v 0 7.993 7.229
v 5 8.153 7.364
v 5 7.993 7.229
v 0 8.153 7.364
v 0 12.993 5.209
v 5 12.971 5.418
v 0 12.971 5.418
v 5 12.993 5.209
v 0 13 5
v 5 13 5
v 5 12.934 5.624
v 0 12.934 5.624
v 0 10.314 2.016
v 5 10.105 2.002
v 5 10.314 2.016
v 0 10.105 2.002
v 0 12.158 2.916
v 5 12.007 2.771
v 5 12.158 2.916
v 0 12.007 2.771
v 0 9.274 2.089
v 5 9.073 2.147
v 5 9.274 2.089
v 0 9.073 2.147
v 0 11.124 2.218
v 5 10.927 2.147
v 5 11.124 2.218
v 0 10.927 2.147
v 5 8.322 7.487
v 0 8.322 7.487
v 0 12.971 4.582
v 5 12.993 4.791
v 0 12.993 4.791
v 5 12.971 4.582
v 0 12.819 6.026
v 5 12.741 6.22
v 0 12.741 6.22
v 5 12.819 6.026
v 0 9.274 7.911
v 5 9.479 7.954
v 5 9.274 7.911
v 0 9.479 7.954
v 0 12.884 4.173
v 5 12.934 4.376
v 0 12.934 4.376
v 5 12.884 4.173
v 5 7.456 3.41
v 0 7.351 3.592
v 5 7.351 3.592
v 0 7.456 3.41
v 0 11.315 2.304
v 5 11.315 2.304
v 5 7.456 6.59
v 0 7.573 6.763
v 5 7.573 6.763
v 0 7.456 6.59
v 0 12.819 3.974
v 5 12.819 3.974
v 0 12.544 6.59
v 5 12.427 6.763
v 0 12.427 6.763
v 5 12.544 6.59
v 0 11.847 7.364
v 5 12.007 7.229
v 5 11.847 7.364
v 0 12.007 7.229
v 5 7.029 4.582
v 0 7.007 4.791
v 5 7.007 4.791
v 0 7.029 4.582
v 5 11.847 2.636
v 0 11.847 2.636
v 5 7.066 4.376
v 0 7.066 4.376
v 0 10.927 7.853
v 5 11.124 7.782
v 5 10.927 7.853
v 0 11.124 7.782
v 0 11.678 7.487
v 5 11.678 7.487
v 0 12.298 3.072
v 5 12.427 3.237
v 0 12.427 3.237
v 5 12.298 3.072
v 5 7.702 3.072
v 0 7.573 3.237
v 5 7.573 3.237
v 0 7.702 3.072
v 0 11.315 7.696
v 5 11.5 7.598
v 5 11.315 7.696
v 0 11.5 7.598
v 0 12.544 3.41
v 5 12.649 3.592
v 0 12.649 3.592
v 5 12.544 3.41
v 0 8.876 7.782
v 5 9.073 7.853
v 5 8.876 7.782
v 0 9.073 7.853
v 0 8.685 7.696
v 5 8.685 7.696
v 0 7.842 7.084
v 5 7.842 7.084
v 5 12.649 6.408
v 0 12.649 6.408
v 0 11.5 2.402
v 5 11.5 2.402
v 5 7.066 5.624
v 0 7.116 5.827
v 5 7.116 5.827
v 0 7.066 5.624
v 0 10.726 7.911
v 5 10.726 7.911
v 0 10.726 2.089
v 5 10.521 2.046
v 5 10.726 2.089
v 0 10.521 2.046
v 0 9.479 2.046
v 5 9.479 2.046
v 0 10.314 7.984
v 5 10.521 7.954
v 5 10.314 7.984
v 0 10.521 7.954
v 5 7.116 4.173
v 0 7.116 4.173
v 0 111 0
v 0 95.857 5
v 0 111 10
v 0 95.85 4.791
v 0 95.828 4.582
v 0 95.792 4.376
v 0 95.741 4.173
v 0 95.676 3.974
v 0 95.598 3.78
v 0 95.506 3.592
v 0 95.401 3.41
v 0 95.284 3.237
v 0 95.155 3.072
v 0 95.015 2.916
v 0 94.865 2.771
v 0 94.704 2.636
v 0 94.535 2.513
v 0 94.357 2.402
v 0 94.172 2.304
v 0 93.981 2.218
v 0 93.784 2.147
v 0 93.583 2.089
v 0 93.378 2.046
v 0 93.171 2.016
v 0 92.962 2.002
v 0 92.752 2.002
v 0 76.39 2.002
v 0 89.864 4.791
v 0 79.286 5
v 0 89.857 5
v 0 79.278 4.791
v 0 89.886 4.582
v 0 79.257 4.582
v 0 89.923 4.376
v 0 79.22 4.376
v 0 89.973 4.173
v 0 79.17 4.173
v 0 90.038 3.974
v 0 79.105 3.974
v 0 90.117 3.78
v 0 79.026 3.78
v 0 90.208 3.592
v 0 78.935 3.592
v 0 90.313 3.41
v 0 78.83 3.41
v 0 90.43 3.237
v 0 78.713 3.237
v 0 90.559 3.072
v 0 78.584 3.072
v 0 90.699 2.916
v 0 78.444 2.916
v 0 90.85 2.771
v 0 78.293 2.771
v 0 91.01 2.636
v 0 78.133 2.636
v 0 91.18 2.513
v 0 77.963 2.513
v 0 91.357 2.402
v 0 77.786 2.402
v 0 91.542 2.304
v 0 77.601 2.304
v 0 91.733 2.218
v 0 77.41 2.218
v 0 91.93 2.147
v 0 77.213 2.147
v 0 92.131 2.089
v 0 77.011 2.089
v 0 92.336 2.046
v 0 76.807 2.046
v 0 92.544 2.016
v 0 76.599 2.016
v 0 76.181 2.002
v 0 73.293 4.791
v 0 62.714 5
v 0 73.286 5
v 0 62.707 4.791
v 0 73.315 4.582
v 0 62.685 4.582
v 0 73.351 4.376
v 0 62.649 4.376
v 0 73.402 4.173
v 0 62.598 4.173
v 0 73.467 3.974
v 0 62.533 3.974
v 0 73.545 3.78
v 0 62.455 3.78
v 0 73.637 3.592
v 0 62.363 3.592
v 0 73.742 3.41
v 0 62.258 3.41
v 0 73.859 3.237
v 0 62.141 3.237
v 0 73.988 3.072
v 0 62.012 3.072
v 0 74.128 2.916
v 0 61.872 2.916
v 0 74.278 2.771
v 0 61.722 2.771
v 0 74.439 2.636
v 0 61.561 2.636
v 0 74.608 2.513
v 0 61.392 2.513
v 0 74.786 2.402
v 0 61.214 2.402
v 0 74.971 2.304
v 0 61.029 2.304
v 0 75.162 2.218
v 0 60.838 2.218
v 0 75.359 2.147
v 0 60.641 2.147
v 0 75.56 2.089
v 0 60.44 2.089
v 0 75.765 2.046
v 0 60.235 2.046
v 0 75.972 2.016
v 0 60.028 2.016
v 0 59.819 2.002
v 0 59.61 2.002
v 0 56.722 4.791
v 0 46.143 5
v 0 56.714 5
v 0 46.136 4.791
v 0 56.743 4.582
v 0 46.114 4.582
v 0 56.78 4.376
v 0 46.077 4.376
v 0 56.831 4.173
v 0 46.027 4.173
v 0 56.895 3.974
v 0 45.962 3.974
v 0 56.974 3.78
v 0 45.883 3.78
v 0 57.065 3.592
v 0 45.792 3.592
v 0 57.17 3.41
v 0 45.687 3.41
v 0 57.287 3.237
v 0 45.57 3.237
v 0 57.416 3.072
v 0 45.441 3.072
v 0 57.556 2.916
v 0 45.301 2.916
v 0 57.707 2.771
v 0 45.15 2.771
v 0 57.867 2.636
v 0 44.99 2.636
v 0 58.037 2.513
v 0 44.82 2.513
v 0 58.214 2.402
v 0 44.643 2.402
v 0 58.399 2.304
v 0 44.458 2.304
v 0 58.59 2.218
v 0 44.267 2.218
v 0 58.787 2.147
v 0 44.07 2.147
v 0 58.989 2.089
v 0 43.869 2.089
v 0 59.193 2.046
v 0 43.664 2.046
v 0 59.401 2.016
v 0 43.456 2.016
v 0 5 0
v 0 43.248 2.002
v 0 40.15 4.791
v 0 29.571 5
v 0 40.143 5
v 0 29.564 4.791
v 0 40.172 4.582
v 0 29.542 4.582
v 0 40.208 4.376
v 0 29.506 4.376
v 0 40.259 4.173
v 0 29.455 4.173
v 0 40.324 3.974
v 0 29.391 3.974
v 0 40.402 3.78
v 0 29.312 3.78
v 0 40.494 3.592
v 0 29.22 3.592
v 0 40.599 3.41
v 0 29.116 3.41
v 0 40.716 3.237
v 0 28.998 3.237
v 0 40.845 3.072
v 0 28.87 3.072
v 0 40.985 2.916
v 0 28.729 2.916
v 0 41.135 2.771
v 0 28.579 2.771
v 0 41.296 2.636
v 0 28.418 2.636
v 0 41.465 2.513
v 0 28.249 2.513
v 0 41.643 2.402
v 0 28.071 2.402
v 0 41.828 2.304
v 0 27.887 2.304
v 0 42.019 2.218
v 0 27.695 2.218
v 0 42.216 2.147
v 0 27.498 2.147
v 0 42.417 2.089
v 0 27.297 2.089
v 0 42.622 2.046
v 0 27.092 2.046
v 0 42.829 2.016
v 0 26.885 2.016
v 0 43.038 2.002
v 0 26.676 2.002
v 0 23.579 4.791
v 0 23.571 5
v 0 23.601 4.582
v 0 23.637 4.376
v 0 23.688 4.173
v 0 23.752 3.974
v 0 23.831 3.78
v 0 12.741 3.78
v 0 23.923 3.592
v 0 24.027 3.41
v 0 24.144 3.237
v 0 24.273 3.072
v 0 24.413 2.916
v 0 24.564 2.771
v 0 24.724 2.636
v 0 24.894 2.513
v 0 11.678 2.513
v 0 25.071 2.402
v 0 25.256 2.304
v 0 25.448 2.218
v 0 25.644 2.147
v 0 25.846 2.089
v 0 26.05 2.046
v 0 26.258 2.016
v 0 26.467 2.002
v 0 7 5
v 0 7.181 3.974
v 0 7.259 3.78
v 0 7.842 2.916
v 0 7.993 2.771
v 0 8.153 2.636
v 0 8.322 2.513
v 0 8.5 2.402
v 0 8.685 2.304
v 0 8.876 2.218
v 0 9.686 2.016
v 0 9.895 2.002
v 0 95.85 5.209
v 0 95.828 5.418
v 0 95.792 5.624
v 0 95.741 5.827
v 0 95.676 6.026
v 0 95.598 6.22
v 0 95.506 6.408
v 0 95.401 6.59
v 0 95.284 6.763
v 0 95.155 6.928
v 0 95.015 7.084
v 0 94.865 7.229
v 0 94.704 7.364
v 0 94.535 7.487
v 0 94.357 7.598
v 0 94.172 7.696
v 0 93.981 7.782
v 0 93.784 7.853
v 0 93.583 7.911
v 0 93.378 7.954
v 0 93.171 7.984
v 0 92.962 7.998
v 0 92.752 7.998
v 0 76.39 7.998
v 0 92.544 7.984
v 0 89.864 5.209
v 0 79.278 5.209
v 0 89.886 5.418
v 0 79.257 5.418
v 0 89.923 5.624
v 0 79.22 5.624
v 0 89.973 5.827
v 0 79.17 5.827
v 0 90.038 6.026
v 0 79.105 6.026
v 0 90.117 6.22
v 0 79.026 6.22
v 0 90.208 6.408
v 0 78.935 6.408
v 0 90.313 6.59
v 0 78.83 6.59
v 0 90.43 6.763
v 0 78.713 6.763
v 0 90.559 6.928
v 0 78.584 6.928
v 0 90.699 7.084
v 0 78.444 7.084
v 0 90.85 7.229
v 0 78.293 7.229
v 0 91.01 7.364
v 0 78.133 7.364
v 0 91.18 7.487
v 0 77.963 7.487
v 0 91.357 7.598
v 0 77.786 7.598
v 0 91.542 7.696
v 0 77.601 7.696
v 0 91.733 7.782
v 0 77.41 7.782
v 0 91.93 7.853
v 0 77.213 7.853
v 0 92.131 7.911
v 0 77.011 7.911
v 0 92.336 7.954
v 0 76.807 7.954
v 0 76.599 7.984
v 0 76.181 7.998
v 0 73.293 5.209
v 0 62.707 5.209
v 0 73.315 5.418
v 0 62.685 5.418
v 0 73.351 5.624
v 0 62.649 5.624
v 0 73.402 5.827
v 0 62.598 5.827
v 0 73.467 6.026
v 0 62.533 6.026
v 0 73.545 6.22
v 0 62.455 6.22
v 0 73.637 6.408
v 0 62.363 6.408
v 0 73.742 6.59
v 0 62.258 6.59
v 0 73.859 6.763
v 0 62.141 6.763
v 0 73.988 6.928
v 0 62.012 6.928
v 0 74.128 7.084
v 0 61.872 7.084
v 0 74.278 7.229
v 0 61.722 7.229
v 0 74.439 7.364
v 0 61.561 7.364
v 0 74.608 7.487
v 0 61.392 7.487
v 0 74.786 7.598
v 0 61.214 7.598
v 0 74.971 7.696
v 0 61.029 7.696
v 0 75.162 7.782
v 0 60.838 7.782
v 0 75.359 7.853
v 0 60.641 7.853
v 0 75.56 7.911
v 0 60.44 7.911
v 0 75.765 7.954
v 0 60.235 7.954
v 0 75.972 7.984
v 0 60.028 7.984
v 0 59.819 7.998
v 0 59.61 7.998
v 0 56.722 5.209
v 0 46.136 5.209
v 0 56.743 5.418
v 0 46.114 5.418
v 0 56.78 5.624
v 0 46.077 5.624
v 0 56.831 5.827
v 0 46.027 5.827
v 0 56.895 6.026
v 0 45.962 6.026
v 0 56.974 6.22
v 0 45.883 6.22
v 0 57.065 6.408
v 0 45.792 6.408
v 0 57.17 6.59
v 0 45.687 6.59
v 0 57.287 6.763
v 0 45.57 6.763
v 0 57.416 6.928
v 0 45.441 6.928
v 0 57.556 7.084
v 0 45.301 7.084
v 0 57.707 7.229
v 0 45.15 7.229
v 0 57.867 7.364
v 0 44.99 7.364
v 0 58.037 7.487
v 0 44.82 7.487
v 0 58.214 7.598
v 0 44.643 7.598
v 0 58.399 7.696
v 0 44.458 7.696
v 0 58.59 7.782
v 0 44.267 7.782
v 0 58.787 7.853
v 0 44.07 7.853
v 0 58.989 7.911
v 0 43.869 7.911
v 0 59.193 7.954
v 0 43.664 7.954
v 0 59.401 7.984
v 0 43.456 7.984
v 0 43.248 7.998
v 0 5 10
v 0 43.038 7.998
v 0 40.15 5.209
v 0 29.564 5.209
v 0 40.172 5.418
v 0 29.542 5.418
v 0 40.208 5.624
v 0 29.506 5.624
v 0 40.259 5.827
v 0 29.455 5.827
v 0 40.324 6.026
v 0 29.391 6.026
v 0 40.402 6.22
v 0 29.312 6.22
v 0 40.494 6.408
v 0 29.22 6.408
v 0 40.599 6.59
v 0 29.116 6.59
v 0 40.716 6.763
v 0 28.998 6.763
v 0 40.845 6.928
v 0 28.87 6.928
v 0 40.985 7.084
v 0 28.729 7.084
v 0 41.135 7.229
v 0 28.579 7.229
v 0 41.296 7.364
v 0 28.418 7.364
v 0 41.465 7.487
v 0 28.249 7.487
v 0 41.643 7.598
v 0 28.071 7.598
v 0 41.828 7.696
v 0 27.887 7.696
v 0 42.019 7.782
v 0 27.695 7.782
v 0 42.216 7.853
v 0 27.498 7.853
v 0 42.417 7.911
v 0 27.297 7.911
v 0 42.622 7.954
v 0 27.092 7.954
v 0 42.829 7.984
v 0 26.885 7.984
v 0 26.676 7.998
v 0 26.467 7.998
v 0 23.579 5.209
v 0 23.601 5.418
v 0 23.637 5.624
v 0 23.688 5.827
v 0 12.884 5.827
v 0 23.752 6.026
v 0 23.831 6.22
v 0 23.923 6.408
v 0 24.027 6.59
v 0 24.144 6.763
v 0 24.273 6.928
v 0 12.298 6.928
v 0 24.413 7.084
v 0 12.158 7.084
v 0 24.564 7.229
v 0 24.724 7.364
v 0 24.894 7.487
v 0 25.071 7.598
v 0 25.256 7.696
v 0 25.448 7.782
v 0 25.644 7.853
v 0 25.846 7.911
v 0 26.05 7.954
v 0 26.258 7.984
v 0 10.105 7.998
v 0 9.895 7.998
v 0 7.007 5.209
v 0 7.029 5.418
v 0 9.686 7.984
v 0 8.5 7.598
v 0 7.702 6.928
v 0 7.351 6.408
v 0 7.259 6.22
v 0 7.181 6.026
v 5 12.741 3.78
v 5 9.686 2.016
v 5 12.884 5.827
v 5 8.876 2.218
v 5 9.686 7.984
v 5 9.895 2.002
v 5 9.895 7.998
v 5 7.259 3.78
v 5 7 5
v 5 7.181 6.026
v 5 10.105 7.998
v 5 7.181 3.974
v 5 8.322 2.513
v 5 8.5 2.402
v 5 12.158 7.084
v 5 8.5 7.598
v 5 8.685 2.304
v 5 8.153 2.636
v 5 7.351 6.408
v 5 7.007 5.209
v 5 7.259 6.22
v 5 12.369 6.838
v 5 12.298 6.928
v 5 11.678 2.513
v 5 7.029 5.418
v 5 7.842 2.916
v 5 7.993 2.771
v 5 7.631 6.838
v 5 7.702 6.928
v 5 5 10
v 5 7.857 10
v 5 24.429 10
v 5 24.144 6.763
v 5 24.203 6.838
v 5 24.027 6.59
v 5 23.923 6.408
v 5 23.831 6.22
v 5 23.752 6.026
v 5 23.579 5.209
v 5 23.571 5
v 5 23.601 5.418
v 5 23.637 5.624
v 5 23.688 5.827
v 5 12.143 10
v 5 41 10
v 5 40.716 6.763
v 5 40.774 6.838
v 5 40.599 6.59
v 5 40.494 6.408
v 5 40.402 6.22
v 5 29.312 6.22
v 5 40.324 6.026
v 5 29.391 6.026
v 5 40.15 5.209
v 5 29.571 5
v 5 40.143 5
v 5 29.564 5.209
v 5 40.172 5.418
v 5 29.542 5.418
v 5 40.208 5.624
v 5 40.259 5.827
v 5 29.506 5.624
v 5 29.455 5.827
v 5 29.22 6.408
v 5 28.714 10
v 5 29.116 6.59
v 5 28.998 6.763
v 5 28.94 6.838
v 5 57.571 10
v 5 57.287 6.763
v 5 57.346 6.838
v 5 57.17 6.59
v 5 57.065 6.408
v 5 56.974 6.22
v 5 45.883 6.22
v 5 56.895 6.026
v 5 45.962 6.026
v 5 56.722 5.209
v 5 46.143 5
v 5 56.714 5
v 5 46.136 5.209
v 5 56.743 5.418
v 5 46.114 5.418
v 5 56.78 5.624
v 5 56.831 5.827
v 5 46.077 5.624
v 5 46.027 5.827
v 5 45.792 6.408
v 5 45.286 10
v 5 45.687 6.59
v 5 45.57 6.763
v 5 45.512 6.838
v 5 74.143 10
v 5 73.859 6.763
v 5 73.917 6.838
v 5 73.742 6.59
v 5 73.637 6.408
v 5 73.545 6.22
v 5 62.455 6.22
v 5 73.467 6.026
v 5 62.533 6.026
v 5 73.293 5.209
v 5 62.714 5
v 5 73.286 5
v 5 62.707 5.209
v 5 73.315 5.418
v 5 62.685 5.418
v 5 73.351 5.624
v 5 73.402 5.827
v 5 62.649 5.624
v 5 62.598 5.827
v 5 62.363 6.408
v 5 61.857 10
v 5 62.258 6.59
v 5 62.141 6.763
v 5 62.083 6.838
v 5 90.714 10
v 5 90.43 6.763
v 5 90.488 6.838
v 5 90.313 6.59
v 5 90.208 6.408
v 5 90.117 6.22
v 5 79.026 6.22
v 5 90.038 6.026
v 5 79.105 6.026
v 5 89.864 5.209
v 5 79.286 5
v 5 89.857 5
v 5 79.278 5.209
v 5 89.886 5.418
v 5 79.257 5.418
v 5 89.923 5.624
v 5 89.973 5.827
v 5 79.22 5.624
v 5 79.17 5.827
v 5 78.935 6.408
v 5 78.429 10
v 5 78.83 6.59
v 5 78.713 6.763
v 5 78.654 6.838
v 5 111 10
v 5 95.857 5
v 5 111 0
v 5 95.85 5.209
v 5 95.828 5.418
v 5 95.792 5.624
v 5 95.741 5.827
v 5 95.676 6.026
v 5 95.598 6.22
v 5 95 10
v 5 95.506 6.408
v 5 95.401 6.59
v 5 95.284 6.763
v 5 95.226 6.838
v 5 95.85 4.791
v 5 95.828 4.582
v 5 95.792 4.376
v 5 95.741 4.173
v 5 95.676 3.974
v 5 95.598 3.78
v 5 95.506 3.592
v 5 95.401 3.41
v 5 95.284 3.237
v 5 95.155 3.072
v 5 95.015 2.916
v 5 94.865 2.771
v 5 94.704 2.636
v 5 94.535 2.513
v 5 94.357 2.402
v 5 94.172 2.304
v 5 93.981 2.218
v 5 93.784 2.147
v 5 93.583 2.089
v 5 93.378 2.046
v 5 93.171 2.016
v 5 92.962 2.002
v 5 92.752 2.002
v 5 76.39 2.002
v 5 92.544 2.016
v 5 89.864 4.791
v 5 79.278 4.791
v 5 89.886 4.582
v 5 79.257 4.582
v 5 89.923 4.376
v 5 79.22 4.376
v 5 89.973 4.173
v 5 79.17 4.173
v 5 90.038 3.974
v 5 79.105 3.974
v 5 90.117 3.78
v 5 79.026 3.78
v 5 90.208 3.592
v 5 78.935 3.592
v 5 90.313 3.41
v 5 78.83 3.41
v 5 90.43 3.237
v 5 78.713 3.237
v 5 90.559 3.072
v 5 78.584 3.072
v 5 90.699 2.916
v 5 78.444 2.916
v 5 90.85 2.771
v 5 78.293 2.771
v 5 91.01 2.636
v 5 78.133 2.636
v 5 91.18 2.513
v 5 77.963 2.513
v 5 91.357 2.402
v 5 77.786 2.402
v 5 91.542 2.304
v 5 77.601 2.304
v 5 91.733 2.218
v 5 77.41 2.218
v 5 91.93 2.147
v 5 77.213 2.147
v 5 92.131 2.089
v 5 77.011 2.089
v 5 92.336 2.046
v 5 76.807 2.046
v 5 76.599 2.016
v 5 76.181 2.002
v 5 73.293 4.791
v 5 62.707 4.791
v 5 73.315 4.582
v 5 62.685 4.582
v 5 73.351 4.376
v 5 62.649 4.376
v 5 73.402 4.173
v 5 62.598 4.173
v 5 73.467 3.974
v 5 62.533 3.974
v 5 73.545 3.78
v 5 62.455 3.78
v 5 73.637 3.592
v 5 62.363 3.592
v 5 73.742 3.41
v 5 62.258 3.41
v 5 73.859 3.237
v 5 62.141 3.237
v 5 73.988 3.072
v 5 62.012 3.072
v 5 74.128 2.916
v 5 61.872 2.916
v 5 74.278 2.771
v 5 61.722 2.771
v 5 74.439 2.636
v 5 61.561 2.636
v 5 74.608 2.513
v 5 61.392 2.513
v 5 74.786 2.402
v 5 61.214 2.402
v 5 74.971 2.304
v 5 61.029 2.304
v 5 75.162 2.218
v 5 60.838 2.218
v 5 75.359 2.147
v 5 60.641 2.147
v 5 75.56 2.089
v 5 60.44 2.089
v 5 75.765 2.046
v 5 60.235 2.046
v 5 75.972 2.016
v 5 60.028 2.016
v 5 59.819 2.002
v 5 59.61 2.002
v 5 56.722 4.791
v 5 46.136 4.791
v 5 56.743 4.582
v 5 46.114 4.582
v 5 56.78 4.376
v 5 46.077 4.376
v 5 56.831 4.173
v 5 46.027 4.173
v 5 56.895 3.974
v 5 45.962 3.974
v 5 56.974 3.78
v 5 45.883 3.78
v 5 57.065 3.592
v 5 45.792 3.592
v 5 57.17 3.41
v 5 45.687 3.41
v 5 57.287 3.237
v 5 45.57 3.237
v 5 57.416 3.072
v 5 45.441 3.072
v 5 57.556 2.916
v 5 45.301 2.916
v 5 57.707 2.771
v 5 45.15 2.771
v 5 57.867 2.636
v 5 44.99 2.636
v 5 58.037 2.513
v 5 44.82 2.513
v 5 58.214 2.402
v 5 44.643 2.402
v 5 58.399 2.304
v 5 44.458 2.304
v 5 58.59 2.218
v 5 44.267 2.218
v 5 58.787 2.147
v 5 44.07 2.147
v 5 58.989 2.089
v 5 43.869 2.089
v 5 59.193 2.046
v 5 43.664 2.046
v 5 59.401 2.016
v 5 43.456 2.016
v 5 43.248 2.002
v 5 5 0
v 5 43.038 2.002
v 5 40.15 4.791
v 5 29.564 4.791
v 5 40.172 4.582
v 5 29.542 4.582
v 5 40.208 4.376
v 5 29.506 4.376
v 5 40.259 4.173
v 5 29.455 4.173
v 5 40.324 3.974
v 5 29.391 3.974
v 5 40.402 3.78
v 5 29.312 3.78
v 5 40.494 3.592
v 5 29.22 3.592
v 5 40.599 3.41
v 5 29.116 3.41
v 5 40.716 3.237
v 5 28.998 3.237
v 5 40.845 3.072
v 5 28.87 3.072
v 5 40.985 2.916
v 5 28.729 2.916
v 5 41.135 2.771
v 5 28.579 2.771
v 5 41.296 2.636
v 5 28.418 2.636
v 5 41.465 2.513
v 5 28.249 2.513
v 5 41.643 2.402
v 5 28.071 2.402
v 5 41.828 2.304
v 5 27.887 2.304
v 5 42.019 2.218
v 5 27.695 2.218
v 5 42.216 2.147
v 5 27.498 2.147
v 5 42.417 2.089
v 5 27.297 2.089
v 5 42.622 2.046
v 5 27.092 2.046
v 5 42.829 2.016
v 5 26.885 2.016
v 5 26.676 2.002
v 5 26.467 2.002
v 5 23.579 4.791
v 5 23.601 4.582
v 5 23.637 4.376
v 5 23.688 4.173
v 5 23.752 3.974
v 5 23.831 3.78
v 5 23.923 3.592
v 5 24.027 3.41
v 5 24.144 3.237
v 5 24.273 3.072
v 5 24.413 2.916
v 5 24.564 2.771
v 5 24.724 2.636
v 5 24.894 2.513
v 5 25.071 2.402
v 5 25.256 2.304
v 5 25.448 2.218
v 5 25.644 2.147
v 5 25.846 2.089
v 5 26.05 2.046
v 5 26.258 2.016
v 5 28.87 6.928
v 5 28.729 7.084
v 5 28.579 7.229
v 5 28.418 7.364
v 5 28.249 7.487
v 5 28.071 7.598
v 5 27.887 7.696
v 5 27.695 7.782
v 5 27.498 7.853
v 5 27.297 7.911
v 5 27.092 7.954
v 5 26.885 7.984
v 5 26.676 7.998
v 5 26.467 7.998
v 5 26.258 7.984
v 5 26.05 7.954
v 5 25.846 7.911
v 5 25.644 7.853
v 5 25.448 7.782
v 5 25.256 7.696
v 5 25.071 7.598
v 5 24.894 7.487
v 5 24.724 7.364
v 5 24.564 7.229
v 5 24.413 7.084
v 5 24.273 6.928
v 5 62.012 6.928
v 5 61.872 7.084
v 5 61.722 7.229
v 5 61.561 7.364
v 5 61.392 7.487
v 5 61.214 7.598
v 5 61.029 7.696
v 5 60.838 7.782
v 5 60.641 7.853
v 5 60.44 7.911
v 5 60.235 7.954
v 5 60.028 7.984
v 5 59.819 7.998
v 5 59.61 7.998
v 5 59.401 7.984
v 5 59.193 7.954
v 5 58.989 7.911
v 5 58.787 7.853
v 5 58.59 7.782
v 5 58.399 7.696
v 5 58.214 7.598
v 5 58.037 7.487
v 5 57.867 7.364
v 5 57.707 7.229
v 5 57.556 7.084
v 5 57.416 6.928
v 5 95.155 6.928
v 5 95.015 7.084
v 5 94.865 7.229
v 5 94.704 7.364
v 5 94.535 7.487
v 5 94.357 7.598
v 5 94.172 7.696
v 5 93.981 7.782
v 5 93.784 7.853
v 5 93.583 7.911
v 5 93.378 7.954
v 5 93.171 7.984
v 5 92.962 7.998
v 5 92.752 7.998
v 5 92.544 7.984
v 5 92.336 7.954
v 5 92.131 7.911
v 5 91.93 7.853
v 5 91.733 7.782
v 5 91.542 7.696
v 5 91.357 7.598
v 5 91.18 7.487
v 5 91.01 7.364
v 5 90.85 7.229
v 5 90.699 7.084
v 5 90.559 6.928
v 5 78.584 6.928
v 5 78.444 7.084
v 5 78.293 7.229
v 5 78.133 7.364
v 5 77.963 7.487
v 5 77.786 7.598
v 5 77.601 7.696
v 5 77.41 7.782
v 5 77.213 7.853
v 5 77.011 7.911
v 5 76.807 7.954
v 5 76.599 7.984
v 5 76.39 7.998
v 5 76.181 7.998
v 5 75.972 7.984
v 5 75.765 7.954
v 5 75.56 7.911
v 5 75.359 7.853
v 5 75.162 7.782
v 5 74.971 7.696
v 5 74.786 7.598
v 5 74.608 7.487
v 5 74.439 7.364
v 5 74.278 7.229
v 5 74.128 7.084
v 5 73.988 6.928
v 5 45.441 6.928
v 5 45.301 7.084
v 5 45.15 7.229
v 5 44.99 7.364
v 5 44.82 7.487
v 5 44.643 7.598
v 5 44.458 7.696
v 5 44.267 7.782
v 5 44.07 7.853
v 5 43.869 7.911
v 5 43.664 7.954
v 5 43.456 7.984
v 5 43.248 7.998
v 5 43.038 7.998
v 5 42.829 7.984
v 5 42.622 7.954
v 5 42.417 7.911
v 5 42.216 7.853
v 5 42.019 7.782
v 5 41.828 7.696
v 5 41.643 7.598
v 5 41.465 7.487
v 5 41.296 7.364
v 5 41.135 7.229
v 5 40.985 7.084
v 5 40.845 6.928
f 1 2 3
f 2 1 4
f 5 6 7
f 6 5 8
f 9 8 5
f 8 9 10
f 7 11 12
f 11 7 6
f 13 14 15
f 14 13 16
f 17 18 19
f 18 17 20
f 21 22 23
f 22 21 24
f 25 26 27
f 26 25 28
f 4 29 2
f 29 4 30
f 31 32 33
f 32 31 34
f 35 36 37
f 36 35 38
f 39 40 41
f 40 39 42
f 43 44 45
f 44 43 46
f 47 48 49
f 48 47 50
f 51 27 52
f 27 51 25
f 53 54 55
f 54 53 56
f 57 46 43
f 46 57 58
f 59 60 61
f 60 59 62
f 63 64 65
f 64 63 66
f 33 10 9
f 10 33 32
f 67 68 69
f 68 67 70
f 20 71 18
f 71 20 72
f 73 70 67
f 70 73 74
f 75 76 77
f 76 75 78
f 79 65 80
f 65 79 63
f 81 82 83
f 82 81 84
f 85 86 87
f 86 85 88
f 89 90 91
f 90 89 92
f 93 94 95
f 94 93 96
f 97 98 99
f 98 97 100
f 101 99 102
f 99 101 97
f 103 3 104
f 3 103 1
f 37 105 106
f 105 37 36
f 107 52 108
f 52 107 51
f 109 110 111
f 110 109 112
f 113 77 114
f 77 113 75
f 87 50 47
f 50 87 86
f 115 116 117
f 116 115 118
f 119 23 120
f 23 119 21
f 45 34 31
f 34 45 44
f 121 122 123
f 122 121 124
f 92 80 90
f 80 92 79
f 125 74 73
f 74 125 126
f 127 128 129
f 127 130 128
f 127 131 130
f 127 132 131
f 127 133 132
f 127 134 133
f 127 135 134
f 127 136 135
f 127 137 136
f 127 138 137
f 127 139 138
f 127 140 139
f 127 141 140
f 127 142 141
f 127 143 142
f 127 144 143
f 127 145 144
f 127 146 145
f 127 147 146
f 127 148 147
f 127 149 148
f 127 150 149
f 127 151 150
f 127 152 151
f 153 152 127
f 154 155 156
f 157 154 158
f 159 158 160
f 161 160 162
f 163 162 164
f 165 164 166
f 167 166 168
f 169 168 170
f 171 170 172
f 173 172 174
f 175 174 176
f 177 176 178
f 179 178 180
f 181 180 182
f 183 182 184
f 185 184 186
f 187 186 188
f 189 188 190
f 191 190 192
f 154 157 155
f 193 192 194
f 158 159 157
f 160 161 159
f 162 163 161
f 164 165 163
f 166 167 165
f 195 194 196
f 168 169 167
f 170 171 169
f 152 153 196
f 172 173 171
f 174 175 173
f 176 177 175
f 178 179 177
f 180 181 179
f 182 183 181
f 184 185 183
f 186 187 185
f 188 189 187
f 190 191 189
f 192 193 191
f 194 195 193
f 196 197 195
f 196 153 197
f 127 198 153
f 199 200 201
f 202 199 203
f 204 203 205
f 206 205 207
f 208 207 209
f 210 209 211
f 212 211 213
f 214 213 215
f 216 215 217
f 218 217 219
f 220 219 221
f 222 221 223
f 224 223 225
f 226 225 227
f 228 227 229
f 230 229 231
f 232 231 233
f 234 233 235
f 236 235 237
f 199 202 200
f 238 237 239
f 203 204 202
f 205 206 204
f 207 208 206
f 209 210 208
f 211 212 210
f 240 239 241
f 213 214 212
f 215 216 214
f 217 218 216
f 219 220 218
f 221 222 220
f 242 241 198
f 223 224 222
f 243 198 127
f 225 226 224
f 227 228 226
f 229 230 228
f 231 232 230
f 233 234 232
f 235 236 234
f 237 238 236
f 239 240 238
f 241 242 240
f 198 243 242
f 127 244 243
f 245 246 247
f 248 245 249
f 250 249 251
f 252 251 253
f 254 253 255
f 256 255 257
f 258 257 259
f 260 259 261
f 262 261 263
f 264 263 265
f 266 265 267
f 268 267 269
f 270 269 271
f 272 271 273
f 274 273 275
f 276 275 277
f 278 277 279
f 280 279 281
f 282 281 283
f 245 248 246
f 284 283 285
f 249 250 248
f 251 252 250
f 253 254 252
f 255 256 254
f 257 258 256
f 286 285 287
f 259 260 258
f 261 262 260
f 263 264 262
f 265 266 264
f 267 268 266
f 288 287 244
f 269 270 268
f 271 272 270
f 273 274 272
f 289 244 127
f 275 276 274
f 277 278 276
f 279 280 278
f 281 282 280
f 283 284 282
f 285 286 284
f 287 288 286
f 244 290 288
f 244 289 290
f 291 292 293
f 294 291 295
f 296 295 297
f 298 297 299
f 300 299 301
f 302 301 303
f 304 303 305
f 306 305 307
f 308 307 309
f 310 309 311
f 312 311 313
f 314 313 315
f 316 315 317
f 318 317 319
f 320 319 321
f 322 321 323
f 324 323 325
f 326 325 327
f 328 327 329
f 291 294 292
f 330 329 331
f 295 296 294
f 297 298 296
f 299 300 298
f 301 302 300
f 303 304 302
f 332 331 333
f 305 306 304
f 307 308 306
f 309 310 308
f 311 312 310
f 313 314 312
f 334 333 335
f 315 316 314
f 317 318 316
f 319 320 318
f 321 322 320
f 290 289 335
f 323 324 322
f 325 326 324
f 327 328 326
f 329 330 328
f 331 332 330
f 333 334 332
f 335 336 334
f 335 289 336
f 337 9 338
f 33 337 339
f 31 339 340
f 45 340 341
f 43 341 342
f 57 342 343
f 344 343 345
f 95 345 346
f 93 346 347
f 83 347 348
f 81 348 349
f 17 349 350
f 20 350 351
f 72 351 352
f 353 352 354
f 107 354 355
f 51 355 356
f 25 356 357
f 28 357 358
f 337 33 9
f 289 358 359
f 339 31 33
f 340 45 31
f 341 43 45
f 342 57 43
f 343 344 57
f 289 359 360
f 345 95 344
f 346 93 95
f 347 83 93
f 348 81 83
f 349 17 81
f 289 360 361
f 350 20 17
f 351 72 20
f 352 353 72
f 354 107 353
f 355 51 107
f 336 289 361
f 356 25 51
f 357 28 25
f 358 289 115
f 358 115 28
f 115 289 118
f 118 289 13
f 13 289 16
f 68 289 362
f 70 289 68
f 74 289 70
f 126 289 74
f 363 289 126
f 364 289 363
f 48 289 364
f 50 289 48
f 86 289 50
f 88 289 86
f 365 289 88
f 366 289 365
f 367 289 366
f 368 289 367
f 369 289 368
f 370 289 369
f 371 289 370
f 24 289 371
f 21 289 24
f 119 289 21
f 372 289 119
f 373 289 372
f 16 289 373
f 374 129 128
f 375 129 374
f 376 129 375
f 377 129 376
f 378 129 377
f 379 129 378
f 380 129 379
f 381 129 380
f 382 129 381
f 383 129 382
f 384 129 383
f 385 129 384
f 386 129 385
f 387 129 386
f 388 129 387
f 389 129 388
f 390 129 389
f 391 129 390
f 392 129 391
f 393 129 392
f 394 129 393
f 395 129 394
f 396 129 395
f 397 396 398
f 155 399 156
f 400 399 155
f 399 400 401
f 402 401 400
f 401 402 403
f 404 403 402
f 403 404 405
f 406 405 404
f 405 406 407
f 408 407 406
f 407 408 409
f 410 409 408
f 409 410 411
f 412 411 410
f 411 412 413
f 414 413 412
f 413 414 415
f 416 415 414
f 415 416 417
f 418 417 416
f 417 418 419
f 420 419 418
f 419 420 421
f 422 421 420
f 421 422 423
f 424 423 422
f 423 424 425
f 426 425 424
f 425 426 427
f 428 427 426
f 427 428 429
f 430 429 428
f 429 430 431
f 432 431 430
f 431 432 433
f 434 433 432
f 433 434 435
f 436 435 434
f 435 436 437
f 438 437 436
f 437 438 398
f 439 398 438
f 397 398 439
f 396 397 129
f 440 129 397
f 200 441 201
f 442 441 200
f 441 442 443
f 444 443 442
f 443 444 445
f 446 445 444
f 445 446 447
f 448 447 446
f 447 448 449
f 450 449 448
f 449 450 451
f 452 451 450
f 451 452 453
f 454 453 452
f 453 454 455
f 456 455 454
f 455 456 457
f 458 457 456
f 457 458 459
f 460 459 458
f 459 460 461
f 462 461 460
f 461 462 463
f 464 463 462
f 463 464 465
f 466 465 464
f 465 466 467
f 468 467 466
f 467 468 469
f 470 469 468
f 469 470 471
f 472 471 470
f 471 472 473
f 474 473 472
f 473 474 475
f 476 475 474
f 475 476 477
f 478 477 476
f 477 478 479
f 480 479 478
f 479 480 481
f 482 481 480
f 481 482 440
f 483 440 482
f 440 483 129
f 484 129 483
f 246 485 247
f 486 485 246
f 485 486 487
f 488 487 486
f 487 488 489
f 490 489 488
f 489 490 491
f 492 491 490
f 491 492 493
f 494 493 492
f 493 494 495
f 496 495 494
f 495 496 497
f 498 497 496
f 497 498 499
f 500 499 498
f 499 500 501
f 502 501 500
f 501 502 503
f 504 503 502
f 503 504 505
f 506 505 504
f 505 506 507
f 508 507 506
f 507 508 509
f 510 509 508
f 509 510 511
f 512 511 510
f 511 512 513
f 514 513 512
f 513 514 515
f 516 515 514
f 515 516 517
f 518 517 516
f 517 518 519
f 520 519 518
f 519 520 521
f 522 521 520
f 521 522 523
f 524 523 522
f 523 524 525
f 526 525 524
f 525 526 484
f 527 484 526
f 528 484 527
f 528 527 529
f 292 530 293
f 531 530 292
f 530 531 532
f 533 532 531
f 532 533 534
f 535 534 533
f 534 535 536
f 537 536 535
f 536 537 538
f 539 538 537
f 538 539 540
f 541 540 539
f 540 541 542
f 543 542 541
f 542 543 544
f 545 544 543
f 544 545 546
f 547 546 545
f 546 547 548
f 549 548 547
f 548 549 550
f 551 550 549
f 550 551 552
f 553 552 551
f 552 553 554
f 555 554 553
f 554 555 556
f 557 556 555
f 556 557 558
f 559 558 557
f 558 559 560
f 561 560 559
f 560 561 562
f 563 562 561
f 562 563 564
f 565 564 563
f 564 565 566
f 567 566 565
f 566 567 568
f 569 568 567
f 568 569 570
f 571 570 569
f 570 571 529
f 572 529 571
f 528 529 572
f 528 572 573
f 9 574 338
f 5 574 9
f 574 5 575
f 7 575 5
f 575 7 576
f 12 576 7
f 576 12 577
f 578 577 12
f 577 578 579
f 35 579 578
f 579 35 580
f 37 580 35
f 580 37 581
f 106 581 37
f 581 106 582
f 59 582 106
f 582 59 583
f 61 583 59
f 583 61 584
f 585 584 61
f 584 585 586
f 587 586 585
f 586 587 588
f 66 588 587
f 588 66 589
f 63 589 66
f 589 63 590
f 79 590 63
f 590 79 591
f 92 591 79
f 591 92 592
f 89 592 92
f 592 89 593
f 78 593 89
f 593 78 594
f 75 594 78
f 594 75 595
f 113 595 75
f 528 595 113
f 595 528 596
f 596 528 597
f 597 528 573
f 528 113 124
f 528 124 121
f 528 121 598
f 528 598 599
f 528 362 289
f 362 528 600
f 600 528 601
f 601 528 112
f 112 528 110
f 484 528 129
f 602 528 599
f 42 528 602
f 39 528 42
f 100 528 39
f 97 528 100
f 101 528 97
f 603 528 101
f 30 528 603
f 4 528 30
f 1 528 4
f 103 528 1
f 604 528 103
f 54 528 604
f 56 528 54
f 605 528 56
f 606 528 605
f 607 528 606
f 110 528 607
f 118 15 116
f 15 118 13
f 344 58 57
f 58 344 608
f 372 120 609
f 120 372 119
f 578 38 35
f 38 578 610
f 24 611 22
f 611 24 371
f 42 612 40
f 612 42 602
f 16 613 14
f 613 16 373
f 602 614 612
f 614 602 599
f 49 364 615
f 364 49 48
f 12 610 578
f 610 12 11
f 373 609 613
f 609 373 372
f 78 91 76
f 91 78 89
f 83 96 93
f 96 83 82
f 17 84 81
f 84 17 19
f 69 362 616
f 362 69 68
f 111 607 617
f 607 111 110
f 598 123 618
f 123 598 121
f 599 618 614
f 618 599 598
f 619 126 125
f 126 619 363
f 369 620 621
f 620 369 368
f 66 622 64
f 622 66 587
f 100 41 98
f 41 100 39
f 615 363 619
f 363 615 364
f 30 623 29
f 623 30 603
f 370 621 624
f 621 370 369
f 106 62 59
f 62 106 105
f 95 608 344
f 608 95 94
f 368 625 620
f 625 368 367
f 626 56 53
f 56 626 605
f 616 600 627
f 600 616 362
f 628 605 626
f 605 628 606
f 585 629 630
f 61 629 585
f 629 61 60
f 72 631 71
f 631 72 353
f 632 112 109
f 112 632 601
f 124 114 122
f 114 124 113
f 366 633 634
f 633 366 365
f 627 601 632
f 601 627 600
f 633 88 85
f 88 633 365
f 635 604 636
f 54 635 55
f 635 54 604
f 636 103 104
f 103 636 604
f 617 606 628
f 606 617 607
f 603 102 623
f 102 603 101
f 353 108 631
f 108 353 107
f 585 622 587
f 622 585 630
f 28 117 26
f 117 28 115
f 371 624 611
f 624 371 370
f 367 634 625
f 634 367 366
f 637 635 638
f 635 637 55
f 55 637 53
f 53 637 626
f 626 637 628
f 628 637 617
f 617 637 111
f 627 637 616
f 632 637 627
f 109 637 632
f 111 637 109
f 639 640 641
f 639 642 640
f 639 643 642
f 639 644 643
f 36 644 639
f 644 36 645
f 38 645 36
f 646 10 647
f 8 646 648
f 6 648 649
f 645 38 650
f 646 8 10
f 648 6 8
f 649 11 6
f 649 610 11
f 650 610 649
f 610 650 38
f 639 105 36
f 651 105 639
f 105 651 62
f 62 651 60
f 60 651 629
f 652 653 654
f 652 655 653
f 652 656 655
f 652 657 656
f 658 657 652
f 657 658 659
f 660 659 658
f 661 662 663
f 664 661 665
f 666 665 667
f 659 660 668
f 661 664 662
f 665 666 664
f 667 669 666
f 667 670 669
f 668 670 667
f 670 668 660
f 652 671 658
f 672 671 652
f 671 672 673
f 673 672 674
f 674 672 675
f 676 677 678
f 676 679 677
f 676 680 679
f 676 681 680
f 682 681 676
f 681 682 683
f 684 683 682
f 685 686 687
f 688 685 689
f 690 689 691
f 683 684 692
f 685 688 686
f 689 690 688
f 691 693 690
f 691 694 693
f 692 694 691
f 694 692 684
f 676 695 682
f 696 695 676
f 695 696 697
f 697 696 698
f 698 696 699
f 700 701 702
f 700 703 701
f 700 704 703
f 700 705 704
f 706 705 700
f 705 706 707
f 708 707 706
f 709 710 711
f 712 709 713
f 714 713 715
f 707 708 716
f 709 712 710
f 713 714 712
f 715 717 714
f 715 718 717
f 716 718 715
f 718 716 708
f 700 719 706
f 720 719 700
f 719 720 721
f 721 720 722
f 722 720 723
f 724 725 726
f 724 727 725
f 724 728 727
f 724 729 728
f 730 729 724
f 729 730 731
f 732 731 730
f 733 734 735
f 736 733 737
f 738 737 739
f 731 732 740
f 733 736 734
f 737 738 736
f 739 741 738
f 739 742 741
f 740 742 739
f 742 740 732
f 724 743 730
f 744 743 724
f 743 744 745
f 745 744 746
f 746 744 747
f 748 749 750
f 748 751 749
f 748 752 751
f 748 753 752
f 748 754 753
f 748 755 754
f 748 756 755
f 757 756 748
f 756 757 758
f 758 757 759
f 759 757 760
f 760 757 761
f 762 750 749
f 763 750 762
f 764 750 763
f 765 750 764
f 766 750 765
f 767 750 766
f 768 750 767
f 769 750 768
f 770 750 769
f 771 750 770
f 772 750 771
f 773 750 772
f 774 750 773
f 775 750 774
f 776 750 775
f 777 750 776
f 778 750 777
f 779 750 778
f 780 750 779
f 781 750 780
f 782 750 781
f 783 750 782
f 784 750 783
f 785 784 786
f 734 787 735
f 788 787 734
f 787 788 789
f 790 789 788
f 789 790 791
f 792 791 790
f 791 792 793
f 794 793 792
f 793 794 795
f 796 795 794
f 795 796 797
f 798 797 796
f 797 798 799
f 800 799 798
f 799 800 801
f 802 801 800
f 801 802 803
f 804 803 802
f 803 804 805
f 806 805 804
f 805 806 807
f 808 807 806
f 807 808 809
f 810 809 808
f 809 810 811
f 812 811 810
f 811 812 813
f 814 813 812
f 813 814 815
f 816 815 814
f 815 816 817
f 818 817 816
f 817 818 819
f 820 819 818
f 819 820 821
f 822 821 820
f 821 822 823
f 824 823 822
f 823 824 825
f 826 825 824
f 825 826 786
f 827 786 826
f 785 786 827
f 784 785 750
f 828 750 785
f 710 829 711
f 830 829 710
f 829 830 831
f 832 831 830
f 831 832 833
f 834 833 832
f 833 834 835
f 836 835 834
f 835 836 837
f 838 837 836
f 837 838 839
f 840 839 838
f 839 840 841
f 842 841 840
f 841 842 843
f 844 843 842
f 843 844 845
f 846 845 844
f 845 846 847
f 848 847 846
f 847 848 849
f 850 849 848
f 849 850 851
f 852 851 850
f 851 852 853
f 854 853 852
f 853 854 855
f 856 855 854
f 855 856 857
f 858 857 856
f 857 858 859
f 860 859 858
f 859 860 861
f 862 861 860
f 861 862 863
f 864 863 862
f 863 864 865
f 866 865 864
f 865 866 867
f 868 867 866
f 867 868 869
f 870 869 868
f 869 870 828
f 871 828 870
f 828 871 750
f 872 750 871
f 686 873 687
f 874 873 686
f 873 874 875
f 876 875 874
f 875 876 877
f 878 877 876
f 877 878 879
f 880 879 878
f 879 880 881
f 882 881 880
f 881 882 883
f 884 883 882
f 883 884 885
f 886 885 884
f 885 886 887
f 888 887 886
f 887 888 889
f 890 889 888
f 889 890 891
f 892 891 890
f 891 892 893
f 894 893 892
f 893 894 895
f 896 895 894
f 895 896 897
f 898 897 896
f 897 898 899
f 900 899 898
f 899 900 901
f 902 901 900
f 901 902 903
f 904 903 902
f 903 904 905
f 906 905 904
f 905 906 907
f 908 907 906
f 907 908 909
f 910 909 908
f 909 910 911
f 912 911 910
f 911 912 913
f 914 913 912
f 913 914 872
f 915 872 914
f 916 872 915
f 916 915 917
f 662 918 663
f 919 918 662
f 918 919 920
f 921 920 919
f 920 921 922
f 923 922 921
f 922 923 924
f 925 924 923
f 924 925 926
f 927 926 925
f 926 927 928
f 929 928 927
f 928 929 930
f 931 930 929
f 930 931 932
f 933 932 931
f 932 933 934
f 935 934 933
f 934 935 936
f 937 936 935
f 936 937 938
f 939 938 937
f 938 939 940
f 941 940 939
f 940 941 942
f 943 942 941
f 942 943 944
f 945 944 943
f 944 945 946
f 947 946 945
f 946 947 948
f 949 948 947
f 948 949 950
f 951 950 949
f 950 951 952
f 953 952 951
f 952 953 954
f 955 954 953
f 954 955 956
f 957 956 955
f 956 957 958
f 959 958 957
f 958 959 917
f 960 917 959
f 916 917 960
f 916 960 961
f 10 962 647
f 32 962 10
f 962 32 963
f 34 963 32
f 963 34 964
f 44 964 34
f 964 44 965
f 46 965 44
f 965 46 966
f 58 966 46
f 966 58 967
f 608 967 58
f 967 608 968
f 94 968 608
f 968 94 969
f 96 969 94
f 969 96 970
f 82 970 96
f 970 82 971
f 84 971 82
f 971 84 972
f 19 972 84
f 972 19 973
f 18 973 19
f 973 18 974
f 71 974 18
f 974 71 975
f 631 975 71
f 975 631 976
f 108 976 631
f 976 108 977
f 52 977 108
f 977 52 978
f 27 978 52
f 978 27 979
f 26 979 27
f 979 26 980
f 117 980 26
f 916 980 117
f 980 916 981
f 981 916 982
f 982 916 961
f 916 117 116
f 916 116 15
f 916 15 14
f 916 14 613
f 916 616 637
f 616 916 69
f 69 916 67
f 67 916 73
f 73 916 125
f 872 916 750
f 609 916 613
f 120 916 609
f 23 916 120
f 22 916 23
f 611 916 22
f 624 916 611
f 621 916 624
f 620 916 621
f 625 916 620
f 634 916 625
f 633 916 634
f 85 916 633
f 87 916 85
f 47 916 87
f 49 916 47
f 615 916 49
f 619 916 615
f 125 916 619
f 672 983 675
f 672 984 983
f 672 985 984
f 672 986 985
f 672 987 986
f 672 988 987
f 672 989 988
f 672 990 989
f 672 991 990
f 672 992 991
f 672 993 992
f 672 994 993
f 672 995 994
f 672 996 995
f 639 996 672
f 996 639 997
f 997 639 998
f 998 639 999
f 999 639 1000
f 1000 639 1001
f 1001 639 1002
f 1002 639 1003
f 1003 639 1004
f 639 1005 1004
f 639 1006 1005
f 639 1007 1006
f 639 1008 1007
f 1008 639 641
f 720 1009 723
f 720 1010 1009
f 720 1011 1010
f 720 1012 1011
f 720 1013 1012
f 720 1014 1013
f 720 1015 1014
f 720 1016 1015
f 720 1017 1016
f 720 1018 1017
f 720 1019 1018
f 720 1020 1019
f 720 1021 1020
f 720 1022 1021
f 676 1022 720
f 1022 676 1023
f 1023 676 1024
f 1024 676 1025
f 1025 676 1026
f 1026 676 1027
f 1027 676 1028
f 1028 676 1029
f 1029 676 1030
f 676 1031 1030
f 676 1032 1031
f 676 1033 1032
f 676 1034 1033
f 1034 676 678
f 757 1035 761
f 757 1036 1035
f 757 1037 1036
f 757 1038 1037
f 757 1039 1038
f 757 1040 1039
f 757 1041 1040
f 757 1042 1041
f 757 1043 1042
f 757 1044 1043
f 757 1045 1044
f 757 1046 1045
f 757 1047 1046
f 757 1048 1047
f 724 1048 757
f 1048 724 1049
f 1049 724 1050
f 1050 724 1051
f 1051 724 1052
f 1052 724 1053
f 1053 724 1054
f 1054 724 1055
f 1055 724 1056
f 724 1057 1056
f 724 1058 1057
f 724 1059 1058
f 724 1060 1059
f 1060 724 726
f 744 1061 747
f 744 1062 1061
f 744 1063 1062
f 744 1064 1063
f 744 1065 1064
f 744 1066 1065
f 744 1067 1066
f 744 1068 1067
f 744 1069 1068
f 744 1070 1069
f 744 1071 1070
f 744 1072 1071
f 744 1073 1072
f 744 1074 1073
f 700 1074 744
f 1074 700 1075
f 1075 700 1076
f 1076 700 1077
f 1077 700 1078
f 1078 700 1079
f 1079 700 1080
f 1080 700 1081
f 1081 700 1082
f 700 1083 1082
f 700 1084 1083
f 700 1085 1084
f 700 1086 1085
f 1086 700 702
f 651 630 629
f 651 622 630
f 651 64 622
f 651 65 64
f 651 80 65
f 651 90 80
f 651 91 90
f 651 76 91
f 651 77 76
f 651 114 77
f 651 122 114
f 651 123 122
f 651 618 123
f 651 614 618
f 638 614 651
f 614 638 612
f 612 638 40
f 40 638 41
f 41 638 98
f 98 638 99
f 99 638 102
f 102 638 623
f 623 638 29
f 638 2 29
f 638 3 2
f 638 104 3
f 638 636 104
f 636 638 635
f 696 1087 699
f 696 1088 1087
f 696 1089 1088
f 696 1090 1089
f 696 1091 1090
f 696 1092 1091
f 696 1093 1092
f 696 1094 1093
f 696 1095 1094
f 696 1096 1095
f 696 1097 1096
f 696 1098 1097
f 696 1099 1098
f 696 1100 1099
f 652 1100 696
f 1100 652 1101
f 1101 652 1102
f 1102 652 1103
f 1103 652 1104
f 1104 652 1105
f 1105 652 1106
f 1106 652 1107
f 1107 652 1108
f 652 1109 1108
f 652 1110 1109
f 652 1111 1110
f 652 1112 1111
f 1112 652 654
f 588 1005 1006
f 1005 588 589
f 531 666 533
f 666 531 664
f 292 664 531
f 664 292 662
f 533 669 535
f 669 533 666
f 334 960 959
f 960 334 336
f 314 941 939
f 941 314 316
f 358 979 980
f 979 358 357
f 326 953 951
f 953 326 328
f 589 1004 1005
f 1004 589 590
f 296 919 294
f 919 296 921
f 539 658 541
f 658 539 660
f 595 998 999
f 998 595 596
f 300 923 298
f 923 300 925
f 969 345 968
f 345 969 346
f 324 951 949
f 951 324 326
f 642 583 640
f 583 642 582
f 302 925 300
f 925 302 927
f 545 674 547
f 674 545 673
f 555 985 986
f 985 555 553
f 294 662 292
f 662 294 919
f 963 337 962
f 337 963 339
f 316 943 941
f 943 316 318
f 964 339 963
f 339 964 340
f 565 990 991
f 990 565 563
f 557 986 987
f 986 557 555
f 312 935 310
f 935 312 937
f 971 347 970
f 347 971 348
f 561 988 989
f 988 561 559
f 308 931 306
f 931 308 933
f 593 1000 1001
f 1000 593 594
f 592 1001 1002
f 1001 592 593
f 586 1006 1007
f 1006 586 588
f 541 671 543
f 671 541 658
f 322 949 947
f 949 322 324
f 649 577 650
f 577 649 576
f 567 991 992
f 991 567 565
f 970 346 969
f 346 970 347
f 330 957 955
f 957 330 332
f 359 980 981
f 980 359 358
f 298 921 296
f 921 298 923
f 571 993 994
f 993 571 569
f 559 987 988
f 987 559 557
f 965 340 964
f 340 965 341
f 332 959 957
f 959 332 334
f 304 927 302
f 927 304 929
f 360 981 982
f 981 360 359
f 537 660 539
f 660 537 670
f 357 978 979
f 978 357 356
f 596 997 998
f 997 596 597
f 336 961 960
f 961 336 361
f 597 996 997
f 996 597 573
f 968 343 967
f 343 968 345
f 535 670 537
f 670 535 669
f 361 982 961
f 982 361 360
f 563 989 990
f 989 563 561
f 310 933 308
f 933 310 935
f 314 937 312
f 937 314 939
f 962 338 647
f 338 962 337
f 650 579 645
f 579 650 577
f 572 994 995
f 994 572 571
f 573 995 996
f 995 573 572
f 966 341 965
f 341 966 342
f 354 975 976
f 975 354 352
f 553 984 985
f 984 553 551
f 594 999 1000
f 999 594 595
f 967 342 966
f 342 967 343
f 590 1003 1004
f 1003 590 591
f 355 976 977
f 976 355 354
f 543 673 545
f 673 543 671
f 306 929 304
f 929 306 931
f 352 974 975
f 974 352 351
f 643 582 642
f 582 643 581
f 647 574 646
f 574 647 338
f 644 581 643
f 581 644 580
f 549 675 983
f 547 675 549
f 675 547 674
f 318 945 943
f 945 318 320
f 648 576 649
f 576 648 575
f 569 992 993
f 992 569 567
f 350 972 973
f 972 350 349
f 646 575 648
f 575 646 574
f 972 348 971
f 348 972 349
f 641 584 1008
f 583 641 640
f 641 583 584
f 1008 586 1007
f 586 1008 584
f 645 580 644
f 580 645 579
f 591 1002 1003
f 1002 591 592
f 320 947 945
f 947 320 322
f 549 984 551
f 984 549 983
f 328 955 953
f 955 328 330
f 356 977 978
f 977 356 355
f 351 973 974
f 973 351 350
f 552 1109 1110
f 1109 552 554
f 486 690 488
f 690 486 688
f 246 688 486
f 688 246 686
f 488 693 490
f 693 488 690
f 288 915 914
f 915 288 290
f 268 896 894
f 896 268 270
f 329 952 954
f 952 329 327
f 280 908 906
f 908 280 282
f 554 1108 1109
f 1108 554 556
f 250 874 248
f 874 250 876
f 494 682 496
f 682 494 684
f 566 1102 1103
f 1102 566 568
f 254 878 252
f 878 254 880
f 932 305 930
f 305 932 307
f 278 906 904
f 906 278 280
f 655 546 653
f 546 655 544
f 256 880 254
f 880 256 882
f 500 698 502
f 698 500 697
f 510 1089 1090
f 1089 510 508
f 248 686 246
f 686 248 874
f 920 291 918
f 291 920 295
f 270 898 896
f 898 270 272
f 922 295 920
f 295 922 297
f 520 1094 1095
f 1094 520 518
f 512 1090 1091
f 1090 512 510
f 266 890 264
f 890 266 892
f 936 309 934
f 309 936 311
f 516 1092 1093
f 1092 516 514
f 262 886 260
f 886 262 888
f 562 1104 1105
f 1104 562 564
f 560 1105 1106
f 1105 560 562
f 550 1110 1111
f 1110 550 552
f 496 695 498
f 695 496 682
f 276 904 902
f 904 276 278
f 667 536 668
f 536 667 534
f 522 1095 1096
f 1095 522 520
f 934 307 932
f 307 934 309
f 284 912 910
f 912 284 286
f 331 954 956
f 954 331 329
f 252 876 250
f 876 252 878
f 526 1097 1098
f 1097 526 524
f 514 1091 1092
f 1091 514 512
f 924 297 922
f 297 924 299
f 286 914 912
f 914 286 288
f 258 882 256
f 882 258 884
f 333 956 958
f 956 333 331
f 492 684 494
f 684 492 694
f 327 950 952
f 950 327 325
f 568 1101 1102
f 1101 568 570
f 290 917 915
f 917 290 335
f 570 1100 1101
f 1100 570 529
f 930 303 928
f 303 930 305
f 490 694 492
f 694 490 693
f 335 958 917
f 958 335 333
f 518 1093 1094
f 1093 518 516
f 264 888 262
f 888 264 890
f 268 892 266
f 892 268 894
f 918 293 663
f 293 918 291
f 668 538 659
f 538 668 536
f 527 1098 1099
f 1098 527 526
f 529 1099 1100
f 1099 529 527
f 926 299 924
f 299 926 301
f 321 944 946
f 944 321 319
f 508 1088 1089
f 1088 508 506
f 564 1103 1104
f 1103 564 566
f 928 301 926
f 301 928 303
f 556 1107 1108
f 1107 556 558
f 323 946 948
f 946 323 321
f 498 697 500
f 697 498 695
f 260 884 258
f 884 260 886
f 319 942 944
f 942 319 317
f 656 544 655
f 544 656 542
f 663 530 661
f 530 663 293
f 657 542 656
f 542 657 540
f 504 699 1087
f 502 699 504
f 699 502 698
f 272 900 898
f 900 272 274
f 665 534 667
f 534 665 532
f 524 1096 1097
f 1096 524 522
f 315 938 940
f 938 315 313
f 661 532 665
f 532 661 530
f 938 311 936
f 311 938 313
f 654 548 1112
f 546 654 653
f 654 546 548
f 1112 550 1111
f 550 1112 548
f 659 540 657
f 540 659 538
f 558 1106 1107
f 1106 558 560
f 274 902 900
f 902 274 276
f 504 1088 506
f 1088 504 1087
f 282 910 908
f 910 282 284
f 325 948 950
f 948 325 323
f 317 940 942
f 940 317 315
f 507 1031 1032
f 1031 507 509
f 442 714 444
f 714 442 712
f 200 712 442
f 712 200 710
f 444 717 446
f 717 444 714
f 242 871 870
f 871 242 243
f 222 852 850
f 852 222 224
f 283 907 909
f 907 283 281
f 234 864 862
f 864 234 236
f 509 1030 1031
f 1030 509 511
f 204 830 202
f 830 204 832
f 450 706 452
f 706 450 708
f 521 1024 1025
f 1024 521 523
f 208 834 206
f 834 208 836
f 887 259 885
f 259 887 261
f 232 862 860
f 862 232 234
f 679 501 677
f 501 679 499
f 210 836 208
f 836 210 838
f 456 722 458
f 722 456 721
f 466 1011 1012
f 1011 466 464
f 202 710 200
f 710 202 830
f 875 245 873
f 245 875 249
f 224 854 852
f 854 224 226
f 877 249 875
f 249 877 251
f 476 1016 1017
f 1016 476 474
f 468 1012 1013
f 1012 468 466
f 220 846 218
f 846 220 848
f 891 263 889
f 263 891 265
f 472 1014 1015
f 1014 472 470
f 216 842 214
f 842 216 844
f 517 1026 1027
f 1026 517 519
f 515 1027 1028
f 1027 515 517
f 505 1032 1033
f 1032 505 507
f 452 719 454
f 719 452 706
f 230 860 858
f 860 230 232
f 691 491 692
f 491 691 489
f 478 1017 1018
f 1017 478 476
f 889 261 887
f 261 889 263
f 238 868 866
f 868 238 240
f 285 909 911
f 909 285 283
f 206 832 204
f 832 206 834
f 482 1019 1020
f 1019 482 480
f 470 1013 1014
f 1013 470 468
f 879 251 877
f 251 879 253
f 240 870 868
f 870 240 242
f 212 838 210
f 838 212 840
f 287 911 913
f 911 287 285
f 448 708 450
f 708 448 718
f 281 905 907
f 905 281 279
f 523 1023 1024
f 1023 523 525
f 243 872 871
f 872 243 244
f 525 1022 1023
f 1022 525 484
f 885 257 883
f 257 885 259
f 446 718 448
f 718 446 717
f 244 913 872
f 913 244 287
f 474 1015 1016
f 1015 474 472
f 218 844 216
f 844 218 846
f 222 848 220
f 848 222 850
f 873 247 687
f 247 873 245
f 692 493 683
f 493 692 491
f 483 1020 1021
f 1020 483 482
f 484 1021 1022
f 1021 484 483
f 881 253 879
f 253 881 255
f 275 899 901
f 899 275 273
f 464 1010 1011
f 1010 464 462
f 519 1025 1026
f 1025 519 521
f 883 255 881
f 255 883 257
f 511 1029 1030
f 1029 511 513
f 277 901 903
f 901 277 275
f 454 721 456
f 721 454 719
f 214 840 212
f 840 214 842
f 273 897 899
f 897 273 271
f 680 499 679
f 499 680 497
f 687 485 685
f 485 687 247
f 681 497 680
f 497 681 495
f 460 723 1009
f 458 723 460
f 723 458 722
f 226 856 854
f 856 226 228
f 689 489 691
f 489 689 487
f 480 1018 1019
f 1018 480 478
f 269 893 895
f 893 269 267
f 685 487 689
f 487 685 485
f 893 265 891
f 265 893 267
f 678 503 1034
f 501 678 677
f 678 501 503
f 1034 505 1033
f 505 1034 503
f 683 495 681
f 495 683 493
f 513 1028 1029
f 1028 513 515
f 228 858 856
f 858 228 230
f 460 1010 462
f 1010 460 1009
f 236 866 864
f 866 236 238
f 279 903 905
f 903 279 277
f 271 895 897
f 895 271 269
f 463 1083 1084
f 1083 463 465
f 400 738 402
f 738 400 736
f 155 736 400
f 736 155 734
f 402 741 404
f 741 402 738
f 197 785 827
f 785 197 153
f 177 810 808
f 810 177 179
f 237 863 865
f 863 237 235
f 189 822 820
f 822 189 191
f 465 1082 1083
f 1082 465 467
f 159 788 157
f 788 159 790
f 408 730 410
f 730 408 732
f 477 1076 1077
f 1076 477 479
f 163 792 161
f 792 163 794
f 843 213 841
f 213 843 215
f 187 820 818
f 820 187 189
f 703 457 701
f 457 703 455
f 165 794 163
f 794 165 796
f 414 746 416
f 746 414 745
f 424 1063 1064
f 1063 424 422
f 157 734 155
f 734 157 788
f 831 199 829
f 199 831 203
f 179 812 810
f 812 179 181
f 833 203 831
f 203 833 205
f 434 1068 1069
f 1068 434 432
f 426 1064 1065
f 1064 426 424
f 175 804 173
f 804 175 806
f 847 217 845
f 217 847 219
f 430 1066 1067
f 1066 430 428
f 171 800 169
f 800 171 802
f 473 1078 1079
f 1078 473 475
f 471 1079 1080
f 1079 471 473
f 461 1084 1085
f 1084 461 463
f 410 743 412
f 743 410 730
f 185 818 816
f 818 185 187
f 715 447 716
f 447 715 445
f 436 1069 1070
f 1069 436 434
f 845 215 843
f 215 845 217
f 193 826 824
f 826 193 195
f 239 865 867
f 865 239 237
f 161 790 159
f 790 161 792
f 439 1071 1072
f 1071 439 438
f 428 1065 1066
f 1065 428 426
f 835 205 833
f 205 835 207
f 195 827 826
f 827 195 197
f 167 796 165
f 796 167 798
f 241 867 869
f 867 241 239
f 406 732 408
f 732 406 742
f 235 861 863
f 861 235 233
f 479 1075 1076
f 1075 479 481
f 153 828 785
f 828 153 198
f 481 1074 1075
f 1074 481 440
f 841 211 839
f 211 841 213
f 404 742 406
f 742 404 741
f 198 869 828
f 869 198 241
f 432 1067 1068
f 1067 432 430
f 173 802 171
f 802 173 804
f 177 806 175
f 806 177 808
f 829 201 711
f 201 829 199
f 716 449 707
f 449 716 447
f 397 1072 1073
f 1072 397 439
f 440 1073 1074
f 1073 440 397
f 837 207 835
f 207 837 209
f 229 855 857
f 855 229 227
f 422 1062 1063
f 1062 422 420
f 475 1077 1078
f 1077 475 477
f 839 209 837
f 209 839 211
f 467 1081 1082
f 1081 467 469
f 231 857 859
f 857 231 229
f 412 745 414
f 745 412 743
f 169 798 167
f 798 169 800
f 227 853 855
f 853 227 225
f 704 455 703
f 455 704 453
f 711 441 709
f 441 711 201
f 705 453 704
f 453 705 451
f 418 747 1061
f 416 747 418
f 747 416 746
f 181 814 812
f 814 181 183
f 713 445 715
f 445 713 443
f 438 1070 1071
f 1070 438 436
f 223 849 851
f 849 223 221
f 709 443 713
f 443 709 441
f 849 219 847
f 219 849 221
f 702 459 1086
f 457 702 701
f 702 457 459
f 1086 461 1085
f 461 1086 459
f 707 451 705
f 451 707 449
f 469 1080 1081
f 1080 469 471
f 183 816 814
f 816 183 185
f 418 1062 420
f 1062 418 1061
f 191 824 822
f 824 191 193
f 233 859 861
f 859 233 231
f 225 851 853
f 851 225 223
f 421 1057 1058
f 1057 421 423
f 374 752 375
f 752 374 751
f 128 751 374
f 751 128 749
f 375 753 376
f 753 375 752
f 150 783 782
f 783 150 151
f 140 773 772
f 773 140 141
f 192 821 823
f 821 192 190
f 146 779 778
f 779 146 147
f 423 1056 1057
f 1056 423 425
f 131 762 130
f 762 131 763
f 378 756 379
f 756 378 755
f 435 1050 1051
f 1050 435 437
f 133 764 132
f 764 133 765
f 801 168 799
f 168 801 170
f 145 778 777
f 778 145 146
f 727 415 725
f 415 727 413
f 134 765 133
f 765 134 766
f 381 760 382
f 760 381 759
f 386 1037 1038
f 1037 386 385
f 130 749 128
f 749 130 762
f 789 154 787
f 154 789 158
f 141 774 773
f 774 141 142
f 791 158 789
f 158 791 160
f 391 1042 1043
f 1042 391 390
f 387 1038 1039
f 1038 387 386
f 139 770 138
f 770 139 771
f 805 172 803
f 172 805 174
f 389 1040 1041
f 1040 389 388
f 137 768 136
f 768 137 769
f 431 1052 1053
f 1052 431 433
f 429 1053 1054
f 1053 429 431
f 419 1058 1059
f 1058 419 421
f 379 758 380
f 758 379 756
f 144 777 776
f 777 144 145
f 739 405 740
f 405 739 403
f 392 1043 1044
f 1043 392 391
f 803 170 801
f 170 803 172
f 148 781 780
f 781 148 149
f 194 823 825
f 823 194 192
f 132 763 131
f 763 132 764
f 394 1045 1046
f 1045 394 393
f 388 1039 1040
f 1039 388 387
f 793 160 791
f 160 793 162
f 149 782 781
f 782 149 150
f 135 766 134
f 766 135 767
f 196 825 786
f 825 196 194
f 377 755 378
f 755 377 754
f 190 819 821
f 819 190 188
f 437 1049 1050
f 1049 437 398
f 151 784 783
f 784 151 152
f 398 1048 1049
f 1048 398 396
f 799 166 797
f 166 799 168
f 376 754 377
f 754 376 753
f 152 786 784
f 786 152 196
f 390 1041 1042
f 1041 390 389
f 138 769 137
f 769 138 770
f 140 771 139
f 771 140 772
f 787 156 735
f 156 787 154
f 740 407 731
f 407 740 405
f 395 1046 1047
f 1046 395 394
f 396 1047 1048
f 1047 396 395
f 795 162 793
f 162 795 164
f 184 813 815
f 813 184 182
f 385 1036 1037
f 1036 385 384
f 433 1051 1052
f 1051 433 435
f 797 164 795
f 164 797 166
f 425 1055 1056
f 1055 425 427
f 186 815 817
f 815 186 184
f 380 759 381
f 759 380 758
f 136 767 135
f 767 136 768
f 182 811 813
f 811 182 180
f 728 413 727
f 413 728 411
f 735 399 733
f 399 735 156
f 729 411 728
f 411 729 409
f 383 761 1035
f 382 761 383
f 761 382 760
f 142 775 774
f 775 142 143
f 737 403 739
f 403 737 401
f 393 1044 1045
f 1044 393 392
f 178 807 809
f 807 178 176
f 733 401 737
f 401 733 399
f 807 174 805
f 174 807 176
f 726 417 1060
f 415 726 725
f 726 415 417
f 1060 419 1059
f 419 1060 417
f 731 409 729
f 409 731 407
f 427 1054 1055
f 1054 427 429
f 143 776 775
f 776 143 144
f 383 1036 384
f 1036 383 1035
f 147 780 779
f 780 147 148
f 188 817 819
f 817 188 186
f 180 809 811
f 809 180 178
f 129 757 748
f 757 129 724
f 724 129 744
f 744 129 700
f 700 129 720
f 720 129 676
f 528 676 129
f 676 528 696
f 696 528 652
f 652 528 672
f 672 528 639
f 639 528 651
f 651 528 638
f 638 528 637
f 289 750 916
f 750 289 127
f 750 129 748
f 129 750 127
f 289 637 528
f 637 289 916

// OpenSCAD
// file: louver.scad
$fn = 90;
module louver(filter_x, x_offset, cylinder_radius, distance_between_cylinders) {
  rotate([90,0,0]) {
    rotate([0, 90, 0]) {

      // cylinder that is meant to be attached to the direction synchronizer
      translate([0, 0, x_offset]) {
        cylinder(h=filter_x - x_offset, r=cylinder_radius);
      }

      translate([0, distance_between_cylinders, 0]) {
        cylinder(h=filter_x + x_offset * 2, r=cylinder_radius);
      }

      // triangle
      translate([0, 0, x_offset * 2]) {
        rotate([0,0,90])
          linear_extrude(height=filter_x - 2 * x_offset) polygon(points=[[0,-2.5],[20 + distance_between_cylinders,0],[0, 2.5]]);
      }
    }
  }
}

depth = 5;
filter_x = 110;
top_z = 60;

translate([depth / 2, 2 * depth, top_z - depth * 4]) {
   louver(filter_x=(110) * 2 - depth, x_offset=depth, cylinder_radius=2.5, distance_between_cylinders=15);
}
// main file
use <louver.scad>

depth = 5;
filter_x = 110;
filter_y = 116;
top_z = 60;
num_louvers = 6;
louver_separation = filter_y / (num_louvers + 1);

difference() {
  translate([0, depth, 0]) {
    cube([depth, filter_y - depth * 2, depth * 2]);
  }

  for (i=[0:1:num_louvers-1]) {
    translate([-depth, 2 * depth + i * louver_separation, depth]) {
      louver(filter_x=(filter_x) * 2 - depth, x_offset=depth, cylinder_radius=3, distance_between_cylinders=15);
    }
  }

}
